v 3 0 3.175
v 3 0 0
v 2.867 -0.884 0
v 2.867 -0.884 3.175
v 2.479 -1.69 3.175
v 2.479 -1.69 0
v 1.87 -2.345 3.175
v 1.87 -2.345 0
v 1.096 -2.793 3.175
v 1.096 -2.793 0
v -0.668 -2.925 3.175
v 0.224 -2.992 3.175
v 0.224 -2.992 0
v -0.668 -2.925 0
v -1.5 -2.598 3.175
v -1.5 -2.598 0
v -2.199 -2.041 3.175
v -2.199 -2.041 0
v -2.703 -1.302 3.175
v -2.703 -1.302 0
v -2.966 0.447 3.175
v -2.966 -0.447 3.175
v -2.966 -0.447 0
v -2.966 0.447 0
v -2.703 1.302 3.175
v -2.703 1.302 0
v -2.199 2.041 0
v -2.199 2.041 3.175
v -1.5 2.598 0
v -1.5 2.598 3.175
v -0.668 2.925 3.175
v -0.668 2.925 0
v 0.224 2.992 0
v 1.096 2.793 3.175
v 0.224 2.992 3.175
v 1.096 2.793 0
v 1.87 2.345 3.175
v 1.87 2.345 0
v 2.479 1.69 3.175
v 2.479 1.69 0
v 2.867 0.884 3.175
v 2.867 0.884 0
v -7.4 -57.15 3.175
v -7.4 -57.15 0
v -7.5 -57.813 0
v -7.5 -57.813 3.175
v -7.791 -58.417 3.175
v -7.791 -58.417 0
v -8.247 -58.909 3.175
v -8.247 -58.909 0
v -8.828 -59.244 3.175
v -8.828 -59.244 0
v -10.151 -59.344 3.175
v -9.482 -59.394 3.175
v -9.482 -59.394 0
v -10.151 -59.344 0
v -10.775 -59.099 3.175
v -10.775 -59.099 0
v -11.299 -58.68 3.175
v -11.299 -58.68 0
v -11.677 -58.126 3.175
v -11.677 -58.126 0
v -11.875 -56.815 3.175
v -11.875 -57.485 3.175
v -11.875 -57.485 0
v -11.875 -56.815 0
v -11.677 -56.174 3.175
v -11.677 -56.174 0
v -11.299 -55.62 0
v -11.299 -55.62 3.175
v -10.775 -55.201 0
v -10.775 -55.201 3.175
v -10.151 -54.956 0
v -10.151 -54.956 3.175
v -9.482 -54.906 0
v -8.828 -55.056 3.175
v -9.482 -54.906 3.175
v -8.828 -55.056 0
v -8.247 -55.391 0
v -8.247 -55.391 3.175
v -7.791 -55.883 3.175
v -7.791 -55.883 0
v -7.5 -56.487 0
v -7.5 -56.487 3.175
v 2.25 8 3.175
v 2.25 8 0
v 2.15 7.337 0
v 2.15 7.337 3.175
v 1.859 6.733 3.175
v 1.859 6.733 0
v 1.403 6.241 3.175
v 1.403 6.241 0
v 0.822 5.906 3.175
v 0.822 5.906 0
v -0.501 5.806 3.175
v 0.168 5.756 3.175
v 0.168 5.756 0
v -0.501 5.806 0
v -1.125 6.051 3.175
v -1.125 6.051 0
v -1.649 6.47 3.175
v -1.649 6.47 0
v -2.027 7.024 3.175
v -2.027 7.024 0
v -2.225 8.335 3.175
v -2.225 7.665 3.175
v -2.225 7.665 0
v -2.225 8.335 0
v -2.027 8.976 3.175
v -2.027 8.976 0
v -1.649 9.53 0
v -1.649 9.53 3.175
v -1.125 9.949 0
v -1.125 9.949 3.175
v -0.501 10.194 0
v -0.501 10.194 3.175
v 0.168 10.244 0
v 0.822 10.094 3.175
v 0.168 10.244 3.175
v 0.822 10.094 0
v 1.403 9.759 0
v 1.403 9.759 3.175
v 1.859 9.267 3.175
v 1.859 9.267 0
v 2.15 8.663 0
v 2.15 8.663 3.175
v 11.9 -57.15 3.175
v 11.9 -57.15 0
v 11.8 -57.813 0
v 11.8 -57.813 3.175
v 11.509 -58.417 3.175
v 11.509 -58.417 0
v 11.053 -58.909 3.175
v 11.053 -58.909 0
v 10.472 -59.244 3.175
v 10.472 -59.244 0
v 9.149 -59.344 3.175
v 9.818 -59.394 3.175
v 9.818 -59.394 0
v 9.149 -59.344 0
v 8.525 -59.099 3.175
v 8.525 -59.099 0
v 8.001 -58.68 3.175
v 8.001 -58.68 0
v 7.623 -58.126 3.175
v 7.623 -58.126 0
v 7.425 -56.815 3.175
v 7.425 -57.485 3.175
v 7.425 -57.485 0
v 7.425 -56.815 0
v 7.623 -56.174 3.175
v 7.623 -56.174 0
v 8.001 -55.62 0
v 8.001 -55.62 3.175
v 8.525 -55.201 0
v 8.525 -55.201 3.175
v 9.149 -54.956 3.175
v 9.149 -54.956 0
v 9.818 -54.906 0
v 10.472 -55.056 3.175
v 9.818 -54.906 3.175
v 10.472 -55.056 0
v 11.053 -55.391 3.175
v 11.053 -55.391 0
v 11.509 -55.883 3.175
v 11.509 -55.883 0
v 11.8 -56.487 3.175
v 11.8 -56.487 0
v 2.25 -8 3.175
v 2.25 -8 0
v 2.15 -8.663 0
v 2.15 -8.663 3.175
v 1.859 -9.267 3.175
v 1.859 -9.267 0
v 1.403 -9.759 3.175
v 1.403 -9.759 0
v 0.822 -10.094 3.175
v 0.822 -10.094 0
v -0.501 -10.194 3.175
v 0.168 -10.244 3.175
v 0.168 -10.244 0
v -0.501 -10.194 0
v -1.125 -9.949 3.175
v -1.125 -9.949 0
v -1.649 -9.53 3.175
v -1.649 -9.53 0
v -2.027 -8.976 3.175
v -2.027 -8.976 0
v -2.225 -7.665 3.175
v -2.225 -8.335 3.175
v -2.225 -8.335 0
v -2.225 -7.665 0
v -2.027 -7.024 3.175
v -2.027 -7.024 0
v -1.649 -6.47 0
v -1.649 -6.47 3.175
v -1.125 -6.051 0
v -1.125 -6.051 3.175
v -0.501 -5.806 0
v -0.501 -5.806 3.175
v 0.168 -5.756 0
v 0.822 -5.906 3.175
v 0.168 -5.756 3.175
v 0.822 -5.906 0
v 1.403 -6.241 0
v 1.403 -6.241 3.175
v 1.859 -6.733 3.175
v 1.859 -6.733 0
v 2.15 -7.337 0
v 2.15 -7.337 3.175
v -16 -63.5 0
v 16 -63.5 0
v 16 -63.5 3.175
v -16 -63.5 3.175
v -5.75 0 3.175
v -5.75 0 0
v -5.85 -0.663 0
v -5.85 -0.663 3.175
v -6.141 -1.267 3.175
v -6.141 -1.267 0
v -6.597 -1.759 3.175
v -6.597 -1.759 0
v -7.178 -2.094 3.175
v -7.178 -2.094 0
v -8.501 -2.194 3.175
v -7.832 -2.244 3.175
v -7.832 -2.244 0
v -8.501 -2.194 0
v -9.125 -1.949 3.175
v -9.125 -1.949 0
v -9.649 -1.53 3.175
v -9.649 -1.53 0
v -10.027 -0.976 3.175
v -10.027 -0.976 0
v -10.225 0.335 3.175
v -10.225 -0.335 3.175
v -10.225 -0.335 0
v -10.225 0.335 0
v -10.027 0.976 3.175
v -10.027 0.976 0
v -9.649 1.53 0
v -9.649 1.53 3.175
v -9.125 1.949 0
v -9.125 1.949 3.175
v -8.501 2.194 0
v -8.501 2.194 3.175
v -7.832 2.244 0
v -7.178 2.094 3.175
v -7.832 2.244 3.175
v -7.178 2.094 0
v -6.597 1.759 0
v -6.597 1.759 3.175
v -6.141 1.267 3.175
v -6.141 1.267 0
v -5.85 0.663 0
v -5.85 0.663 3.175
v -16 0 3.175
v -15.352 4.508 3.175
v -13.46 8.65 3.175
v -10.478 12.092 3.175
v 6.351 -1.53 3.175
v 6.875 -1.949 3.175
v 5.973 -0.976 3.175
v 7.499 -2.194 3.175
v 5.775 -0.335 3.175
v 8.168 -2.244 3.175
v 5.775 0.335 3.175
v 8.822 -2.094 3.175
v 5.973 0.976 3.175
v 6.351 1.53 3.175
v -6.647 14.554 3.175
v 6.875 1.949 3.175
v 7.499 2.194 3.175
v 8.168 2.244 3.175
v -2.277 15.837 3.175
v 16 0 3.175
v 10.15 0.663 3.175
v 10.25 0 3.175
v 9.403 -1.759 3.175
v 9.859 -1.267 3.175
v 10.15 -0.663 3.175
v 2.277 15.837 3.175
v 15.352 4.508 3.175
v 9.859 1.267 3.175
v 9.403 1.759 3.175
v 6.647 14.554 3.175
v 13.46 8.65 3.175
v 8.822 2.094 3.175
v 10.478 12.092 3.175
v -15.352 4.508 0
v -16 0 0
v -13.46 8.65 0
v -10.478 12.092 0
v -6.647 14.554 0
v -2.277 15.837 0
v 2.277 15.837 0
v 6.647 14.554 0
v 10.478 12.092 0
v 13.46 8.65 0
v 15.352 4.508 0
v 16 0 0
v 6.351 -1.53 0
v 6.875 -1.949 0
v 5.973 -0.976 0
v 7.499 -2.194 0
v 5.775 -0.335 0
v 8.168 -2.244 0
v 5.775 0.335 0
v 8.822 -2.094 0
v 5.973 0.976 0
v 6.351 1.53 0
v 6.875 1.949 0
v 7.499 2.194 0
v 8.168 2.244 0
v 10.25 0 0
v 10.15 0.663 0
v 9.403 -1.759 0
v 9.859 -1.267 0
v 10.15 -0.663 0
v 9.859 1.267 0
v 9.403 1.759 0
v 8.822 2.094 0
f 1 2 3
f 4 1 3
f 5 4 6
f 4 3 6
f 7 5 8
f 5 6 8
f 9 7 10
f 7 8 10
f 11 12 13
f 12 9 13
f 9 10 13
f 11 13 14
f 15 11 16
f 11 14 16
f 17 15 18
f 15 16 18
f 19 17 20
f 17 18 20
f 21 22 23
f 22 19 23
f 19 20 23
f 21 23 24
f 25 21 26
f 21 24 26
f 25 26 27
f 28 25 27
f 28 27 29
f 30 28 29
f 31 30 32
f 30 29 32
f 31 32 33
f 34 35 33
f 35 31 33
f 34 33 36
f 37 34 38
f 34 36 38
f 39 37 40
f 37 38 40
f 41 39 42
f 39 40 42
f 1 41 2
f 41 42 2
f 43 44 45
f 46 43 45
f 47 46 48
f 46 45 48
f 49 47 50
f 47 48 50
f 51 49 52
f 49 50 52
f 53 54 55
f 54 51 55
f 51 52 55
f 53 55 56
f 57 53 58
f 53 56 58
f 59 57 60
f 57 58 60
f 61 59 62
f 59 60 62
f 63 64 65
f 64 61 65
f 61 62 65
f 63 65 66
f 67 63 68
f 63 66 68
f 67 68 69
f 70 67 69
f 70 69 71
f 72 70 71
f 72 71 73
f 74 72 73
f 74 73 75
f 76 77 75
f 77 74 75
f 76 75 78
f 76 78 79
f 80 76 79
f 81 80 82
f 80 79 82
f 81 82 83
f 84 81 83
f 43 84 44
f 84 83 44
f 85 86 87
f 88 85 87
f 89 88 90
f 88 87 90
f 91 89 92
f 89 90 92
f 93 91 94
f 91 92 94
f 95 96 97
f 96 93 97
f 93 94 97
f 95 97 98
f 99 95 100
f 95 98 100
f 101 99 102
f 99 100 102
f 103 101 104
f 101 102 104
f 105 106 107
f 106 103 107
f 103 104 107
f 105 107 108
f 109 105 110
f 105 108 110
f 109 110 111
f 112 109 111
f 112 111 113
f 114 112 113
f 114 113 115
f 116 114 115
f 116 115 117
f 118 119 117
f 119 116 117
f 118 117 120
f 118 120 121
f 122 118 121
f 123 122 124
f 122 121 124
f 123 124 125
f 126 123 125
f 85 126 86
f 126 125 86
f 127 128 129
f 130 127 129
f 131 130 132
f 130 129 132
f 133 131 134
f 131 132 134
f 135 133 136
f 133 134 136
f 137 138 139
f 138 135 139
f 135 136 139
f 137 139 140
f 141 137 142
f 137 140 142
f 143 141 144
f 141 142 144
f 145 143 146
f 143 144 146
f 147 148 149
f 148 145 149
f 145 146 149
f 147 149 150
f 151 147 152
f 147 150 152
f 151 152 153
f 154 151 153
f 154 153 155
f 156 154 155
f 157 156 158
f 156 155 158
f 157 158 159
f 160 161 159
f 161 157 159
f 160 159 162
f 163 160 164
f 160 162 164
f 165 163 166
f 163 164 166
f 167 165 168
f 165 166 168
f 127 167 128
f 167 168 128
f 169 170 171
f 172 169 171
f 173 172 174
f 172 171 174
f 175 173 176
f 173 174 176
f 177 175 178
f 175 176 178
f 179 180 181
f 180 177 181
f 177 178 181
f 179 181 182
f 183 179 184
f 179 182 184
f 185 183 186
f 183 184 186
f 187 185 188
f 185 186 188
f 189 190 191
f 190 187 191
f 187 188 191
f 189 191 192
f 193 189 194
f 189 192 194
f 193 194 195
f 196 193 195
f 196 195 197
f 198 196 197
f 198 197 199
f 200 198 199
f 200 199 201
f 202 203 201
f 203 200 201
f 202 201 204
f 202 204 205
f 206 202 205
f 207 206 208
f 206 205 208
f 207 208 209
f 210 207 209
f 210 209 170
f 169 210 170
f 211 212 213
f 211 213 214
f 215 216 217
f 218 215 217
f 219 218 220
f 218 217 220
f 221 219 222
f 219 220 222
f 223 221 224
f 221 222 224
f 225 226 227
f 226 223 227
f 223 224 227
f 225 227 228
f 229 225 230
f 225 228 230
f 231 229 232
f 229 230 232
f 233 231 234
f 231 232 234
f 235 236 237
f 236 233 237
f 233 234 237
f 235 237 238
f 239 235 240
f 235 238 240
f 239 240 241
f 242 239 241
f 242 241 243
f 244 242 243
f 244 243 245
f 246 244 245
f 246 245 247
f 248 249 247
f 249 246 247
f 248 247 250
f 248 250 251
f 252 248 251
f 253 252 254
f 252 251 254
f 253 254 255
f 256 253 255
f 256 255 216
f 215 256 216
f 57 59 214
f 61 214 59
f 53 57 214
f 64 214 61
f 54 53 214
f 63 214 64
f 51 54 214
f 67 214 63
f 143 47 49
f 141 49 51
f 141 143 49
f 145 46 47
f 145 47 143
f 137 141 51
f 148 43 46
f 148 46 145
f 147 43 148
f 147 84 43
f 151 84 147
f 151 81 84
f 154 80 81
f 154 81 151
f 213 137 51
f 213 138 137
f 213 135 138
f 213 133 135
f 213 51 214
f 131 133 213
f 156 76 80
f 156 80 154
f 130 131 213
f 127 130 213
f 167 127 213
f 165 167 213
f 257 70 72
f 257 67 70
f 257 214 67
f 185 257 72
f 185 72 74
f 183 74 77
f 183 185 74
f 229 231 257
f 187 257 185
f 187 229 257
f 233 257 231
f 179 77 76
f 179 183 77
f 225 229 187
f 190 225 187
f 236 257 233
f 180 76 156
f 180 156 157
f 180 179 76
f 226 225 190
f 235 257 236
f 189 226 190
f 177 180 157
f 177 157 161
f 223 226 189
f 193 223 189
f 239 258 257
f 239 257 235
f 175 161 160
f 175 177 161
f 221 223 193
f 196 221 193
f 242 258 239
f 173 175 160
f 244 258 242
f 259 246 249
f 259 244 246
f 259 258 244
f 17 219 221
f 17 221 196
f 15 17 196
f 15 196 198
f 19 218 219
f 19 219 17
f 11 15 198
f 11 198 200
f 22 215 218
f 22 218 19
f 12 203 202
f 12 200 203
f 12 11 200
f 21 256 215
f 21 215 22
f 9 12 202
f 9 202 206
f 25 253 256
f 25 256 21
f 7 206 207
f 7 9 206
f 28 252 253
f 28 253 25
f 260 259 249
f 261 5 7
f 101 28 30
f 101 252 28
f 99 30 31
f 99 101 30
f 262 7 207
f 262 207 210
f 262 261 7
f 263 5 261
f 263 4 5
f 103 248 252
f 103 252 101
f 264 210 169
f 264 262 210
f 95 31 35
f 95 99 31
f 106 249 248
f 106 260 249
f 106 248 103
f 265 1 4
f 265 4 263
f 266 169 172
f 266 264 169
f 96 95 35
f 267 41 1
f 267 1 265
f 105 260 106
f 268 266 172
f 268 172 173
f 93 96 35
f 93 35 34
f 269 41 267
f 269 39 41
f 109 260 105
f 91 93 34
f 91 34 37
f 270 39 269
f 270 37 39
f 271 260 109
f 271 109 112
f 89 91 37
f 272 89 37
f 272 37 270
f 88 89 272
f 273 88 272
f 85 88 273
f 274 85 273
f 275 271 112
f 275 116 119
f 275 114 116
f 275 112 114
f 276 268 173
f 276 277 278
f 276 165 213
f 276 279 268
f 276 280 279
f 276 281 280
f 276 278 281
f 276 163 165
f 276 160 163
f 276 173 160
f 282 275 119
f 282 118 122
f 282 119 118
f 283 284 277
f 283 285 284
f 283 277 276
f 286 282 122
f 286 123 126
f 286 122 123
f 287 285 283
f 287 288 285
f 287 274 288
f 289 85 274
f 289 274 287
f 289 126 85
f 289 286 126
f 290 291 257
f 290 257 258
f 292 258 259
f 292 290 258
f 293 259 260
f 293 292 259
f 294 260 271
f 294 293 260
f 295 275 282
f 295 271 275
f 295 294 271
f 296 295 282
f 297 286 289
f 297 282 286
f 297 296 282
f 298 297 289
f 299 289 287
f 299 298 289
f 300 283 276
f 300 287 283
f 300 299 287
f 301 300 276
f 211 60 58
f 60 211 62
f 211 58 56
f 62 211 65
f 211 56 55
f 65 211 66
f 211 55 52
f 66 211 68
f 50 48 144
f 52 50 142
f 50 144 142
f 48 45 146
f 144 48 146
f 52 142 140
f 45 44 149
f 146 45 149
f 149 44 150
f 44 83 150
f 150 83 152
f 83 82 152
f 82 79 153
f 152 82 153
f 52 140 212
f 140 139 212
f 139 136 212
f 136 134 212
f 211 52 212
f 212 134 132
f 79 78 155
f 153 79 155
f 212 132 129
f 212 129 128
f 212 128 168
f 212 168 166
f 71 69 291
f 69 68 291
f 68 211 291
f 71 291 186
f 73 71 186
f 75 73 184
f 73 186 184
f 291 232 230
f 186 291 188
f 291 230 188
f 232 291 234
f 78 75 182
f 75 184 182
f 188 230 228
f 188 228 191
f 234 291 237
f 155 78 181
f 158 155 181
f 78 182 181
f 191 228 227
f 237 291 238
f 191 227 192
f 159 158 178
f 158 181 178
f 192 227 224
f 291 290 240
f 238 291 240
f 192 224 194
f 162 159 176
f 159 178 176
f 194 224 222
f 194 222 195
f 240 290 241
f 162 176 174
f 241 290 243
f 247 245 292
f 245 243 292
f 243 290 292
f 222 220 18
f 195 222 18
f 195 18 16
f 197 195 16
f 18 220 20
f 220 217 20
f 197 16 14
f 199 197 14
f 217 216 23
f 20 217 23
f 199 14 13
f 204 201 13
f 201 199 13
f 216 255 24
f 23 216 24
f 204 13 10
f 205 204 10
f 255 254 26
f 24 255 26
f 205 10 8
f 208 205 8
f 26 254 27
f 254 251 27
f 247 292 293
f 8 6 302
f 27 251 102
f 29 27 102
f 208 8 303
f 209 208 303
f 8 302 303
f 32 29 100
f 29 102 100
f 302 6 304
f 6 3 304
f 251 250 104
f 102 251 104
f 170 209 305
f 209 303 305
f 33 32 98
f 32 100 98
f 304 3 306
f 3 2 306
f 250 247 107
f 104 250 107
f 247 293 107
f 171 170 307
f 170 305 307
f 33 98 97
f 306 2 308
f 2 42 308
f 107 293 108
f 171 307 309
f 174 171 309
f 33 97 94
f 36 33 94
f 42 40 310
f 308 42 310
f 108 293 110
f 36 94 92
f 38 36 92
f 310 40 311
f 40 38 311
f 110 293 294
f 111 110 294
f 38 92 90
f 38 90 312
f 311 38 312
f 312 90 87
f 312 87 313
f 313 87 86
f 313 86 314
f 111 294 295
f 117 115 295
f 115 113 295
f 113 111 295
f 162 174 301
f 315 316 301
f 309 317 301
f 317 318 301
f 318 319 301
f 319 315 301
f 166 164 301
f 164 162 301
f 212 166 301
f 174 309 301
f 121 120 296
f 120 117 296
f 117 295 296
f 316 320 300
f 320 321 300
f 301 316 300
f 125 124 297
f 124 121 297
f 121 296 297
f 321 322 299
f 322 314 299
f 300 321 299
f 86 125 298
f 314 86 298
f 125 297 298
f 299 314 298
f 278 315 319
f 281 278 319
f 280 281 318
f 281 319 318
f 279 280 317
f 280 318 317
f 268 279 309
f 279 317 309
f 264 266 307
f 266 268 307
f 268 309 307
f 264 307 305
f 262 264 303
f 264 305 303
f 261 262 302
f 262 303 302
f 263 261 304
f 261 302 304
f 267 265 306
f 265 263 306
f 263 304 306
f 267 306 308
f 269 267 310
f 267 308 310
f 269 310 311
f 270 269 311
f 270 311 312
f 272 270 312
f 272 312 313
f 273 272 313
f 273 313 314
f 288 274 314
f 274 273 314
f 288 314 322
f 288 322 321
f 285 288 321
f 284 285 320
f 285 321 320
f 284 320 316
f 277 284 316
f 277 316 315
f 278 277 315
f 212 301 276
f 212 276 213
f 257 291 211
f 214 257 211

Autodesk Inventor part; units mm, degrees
ref_plane "YZ Plane" through (0, 0, 0) normal (1, 0, 0) x (0, 1, 0)
ref_plane "XZ Plane" through (0, 0, 0) normal (0, 1, 0) x (-1, 0, 0)
ref_plane "XY Plane" through (0, 0, 0) normal (0, 0, 1) x (1, 0, 0)
sketch "Sketch1" plane through (0, 0, 0) normal (0, 0, 1) x (1, 0, 0)
  circle A0 centre (0, 0) radius 3
  circle A1 centre (0, 8) radius 2.25
  circle A2 centre (-8, 0) radius 2.25
  circle A3 centre (0, -8) radius 2.25
  circle A4 centre (8, 0) radius 2.25
  circle A5 centre (0, 0) radius 16
  line L0 (-16, 0) -> (-16, -63.5)
  line L1 (16, 0) -> (16, -63.5)
  line L2 (16, -63.5) -> (-16, -63.5)
  line L3 (0, -63.5) -> (0, 16) construction
  circle A6 centre (-9.65, -57.15) radius 2.25
  circle A7 centre (9.65, -57.15) radius 2.25
  point P0 (-16, -31.75)
  dimension "d0" = 6
  dimension "d1" = 4.5
  dimension "d2" = 8
  dimension "d5" = 360
  dimension "d7" = 32
  dimension "d8" = 63.5
  dimension "d9" = 32
  dimension "d10" = 4.5
  dimension "d11" = 4.5
  dimension "d12" = 6.35
  dimension "d13" = 6.35
  dimension "d14" = 6.35
  dimension "d15" = 6.35
  dimension "d16" = 19.3
extrude "Extrusion1" add sketch "Sketch1" along normal blind 3.175
properties part number "New_Wrist"
